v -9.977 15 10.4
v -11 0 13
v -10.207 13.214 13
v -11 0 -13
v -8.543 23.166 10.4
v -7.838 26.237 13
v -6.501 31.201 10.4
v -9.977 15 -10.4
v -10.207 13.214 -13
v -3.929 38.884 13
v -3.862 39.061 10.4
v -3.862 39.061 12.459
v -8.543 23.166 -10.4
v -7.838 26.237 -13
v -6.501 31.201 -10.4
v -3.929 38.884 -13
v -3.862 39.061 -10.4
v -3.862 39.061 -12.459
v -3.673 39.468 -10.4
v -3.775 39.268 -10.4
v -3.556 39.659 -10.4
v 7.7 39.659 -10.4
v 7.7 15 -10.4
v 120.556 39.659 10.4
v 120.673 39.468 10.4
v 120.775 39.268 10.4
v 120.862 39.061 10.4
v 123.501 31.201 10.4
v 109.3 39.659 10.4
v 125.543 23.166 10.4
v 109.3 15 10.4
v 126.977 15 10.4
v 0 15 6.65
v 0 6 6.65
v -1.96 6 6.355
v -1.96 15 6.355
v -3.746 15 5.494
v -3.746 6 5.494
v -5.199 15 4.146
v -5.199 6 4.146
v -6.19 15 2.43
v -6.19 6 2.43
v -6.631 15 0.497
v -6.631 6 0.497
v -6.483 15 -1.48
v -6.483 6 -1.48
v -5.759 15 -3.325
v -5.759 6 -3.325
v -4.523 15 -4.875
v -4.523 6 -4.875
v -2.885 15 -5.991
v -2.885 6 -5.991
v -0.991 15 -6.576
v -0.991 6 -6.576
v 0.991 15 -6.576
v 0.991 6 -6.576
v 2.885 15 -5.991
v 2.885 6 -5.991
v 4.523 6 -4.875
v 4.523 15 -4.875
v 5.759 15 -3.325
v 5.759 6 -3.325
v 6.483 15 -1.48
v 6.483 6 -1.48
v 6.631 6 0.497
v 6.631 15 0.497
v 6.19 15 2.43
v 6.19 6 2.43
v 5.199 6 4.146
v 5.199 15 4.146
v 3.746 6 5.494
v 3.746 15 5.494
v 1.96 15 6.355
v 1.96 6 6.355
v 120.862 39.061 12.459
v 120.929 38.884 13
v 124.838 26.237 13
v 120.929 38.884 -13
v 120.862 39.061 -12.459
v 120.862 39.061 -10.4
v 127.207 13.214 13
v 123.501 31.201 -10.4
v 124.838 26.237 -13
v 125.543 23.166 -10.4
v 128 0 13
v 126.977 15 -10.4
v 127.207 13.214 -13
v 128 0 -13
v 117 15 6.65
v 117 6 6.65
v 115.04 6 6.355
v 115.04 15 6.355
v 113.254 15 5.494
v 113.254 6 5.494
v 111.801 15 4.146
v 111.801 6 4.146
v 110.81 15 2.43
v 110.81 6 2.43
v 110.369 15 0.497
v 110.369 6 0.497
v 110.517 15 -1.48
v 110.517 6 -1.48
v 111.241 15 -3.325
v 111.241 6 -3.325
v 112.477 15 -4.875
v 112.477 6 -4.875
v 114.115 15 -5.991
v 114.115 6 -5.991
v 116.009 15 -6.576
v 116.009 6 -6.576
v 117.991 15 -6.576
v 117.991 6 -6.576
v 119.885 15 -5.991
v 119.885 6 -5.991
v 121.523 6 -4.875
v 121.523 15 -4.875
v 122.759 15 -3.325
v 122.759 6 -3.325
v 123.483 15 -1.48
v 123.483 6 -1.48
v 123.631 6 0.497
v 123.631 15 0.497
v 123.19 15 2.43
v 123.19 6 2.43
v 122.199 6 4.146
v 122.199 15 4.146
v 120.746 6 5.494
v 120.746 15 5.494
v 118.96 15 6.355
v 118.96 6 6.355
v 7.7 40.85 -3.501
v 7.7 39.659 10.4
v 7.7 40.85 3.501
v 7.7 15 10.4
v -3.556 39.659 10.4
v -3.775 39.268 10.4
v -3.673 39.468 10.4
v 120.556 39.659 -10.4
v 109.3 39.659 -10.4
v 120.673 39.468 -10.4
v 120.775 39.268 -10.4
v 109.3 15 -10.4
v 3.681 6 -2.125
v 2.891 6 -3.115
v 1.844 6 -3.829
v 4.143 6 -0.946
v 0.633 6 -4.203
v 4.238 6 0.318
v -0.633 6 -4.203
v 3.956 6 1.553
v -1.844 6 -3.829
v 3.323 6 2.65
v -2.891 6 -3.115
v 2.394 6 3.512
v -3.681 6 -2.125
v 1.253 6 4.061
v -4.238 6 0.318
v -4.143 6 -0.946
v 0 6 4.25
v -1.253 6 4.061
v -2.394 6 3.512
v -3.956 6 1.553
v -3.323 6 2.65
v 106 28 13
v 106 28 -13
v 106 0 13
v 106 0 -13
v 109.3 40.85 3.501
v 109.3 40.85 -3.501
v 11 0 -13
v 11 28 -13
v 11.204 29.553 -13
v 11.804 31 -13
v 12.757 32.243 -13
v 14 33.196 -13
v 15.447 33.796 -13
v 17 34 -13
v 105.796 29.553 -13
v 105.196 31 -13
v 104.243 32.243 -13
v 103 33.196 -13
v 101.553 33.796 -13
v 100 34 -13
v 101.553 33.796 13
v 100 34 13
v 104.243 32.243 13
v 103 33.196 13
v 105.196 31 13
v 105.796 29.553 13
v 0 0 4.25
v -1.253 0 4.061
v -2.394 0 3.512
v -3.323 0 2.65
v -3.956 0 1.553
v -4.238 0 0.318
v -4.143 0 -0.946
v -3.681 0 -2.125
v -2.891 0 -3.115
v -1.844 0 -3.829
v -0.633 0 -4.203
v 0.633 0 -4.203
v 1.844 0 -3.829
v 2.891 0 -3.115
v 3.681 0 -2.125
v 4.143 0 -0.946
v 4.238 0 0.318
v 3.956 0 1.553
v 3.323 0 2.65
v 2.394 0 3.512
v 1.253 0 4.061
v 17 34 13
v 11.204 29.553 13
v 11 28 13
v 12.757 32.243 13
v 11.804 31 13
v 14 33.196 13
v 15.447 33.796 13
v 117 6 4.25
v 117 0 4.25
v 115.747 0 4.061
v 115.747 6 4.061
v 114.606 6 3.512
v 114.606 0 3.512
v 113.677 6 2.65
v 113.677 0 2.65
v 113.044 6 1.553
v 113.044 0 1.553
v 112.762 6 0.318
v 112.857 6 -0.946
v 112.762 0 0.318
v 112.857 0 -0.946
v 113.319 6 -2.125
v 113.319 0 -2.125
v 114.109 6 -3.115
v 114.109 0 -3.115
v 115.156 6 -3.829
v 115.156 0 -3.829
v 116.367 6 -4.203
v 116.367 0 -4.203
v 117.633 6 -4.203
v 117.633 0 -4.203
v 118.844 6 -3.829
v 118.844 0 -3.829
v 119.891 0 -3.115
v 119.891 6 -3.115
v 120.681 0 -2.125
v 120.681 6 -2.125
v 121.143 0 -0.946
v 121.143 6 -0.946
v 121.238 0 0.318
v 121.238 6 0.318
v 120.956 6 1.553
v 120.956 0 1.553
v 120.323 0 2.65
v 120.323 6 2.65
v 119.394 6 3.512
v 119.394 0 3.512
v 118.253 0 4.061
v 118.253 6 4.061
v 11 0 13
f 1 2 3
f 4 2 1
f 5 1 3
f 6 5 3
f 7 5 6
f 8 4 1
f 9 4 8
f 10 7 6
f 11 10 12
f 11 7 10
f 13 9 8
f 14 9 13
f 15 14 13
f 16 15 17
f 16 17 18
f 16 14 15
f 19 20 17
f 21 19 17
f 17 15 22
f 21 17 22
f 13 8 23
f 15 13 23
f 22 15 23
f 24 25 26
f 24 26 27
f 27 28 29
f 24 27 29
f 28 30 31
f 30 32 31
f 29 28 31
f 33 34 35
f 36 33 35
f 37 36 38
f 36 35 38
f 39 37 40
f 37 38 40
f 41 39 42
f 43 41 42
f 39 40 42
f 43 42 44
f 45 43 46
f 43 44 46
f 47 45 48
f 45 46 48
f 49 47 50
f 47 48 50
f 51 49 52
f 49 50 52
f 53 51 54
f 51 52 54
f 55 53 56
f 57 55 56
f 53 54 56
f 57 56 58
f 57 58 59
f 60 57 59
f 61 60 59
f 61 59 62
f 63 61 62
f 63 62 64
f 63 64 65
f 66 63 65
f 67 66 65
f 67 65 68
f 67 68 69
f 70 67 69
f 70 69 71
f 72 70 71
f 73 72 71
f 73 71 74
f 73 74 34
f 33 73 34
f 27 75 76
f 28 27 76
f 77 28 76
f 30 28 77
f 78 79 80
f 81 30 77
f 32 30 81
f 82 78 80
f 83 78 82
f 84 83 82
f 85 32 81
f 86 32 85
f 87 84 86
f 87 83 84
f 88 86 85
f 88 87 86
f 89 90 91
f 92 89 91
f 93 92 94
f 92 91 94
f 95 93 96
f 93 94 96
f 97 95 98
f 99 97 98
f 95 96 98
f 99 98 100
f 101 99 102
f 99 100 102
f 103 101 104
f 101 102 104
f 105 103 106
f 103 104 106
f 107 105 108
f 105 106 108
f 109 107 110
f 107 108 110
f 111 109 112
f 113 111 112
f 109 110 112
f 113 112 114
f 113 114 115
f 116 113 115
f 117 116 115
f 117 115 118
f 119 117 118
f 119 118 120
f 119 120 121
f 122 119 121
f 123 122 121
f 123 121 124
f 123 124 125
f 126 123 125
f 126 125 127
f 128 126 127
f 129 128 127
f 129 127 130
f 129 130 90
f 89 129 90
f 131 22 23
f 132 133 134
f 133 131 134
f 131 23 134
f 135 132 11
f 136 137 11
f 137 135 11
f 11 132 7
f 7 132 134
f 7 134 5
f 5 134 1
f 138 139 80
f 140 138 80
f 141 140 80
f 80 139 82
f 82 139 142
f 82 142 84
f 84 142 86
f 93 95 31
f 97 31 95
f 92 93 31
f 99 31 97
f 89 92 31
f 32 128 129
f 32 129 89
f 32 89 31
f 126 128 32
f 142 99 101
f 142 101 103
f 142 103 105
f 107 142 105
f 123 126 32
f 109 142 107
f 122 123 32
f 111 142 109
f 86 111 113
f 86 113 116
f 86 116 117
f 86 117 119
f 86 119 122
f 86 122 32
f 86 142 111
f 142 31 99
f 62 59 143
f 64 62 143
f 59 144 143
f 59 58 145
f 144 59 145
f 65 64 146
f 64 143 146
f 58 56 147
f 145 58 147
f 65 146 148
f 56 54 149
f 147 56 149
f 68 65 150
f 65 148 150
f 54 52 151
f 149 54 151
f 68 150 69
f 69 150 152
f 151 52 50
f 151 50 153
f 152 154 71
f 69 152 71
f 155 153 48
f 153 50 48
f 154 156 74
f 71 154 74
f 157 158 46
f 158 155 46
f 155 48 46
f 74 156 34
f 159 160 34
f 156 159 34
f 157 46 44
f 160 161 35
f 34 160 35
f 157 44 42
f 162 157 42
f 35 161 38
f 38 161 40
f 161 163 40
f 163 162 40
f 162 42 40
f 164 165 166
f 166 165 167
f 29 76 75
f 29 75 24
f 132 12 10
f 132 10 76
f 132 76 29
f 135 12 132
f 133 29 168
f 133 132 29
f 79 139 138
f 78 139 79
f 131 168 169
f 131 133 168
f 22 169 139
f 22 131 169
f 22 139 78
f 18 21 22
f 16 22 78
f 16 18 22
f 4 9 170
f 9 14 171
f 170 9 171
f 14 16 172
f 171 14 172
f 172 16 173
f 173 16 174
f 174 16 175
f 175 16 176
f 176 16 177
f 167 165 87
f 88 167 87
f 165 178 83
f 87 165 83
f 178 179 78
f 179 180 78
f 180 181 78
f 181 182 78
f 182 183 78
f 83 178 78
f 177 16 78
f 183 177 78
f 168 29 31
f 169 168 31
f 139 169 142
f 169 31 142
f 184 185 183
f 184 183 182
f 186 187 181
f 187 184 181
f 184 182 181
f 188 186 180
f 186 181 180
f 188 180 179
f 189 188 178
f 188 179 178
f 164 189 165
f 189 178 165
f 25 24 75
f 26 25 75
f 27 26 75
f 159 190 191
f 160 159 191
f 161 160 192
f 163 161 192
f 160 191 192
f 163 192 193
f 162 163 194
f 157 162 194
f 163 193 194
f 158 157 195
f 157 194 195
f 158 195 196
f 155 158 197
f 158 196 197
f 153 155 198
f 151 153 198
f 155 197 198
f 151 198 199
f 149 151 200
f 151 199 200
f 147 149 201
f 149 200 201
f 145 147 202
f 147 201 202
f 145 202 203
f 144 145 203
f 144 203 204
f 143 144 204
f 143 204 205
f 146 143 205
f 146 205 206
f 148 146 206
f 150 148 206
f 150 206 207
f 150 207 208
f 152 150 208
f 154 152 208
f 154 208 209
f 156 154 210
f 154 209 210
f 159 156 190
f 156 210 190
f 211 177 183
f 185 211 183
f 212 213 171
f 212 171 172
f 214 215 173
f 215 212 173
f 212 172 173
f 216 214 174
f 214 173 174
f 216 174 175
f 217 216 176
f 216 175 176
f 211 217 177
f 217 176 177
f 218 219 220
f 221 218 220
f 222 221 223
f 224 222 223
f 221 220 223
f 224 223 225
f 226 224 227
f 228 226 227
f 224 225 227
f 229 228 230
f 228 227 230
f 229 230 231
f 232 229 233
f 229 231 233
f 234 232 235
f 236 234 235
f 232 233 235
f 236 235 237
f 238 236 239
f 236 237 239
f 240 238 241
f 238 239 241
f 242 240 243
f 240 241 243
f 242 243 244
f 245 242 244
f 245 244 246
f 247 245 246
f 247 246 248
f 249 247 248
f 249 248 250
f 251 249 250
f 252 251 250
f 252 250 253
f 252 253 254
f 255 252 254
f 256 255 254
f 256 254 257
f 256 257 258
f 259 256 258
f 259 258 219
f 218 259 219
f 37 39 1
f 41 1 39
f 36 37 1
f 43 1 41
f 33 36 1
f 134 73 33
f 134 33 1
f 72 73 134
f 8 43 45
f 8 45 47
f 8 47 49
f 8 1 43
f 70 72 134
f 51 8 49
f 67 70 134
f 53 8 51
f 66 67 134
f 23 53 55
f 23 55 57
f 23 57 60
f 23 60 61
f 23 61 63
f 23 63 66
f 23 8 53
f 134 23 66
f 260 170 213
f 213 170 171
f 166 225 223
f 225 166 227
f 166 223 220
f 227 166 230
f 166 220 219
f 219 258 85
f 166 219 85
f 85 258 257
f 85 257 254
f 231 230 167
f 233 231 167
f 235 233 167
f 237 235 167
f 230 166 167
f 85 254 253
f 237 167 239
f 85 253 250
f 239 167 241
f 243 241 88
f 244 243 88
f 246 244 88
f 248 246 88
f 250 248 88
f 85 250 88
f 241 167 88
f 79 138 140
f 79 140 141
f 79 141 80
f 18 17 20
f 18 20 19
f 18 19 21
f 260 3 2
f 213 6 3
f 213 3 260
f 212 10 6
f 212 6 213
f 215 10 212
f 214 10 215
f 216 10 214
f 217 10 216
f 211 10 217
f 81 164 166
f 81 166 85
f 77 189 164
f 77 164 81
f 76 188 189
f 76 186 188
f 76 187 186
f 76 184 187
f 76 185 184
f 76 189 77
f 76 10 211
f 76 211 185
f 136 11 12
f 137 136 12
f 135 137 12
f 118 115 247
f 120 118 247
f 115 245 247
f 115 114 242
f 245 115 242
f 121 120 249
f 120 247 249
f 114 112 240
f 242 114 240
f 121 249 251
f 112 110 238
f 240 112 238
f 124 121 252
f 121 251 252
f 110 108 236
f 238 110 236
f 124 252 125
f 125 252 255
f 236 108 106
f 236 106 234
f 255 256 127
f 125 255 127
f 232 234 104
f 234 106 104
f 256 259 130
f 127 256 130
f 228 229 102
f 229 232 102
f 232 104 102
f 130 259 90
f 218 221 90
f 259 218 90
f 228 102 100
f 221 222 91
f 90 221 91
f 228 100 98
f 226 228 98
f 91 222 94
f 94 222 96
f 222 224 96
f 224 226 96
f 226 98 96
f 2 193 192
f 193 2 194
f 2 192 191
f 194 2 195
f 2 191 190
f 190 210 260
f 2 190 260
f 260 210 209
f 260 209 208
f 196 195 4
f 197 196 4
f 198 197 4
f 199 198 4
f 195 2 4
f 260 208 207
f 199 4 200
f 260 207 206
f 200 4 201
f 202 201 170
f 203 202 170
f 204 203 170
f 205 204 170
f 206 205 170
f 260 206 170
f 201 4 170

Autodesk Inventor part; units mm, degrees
sketch "Sketch_1" plane through (0, 0, 0) normal (0, 0, 1) x (1, 0, 0)
  line L0 (-11, 0) -> (11, 0)
  line L1 (11, 0) -> (11, 28)
  arc A0 (17, 34) -> (11, 28) centre (17, 28) ccw
  line L2 (17, 34) -> (100, 34)
  arc A1 (106, 28) -> (100, 34) centre (100, 28) ccw
  line L3 (106, 28) -> (106, 0)
  line L4 (106, 0) -> (128, 0)
  arc A2 (128, 0) -> (120.8624, 39.061) centre (17.55, 0) ccw
  arc A3 (120.8624, 39.061) -> (118.0562, 41) centre (118.0562, 38) ccw
  line L5 (118.0562, 41) -> (-1.0562, 41)
  arc A4 (-1.0562, 41) -> (-3.8624, 39.061) centre (-1.0562, 38) ccw
  arc A5 (-3.8624, 39.061) -> (-11, 0) centre (99.45, 0) ccw
extrude "Extrusion1" add sketch "Sketch_1" along normal mid plane 26
sketch "Sketch_2" plane through (0, 15, 0) normal (0, 1, 0) x (1, 0, 0)
  line L0 (-58.5, -26) -> (175.5, -26)
  line L1 (175.5, -26) -> (175.5, 26)
  line L2 (175.5, 26) -> (-58.5, 26)
  line L3 (-58.5, 26) -> (-58.5, -26)
  line L4 (-11, 10.4) -> (7.7, 10.4)
  line L5 (7.7, 10.4) -> (7.7, -10.4)
  line L6 (7.7, -10.4) -> (-11, -10.4)
  line L7 (-11, -10.4) -> (-11, -13)
  line L8 (-11, -13) -> (128, -13)
  line L9 (128, -13) -> (128, -10.4)
  line L10 (128, -10.4) -> (109.3, -10.4)
  line L11 (109.3, -10.4) -> (109.3, 10.4)
  line L12 (109.3, 10.4) -> (128, 10.4)
  line L13 (128, 10.4) -> (128, 13)
  line L14 (128, 13) -> (-11, 13)
  line L15 (-11, 13) -> (-11, 10.4)
extrude "Extrusion2" cut sketch "Sketch_2" along normal blind 58.5
sketch "Sketch3" plane through (0, 15, 0) normal (0, 1, 0) x (1, 0, 0)
  point P0 (0, 0)
hole "Hole1" at (0, 15, 0) direction (0, -1, 0) diameter 8.5 depth 15 counterbore diameter 13.3 counterbore depth 9
sketch "Sketch4" plane through (0, 15, 0) normal (0, 1, 0) x (1, 0, 0)
  point P0 (117, 0)
hole "Hole2" at (117, 15, 0) direction (0, -1, 0) diameter 8.5 depth 15 counterbore diameter 13.3 counterbore depth 9
sketch "Sketch_6" plane through (-11, 0, 0) normal (1, 0, 0) x (0, 0, -1)
  line L0 (-13, 46) -> (-13, 38.8844)
  arc A0 (13, 38.8844) -> (-13, 38.8844) centre (0, 0) ccw
  line L1 (13, 38.8844) -> (13, 46)
  line L2 (13, 46) -> (-13, 46)
extrude "Extrusion3" cut sketch "Sketch_6" along normal blind 139
ref_plane "handle_to_body_XY" through (58.5, 0, 0) normal (0, 1, 0) x (1, 0, 0)
ref_plane "handle_to_body_YZ" through (58.5, 0, 0) normal (1, 0, 0) x (0, 0, -1)
ref_plane "handle_to_body_ZX" through (58.5, 0, 0) normal (0, 0, -1) x (0, 1, 0)
ref_plane "handle_to_bolt1_XY" through (117, 6, 0) normal (0, 1, 0) x (1, 0, 0)
ref_plane "handle_to_bolt1_YZ" through (117, 6, 0) normal (1, 0, 0) x (0, 0, -1)
ref_plane "handle_to_bolt1_ZX" through (117, 6, 0) normal (0, 0, -1) x (0, 1, 0)
ref_plane "handle_to_bolt2_XY" through (0, 6, 0) normal (0, 1, 0) x (1, 0, 0)
ref_plane "handle_to_bolt2_YZ" through (0, 6, 0) normal (1, 0, 0) x (0, 0, -1)
ref_plane "handle_to_bolt2_ZX" through (0, 6, 0) normal (0, 0, -1) x (0, 1, 0)
ref_plane "handle_to_nut1_XY" through (117, 0, 0) normal (0, 1, 0) x (1, 0, 0)
ref_plane "handle_to_nut1_YZ" through (117, 0, 0) normal (1, 0, 0) x (0, 0, -1)
ref_plane "handle_to_nut1_ZX" through (117, 0, 0) normal (0, 0, -1) x (0, 1, 0)
ref_plane "handle_to_nut2_XY" through (0, 0, 0) normal (0, 1, 0) x (1, 0, 0)
ref_plane "handle_to_nut2_YZ" through (0, 0, 0) normal (1, 0, 0) x (0, 0, -1)
ref_plane "handle_to_nut2_ZX" through (0, 0, 0) normal (0, 0, -1) x (0, 1, 0)
ref_plane "to_nut_1_XY" through (0, -5.5, 0) normal (0, -1, 0) x (1, 0, 0)
ref_plane "to_nut_1_YZ" through (0, -5.5, 0) normal (1, 0, 0) x (0, 0, 1)
ref_plane "to_nut_1_ZX" through (0, -5.5, 0) normal (0, 0, 1) x (0, -1, 0)
ref_plane "to_nut_2_XY" through (117, -5.5, 0) normal (0, -1, 0) x (1, 0, 0)
ref_plane "to_nut_2_YZ" through (117, -5.5, 0) normal (1, 0, 0) x (0, 0, 1)
ref_plane "to_nut_2_ZX" through (117, -5.5, 0) normal (0, 0, 1) x (0, -1, 0)
properties part number "UPCN26-B-41"
